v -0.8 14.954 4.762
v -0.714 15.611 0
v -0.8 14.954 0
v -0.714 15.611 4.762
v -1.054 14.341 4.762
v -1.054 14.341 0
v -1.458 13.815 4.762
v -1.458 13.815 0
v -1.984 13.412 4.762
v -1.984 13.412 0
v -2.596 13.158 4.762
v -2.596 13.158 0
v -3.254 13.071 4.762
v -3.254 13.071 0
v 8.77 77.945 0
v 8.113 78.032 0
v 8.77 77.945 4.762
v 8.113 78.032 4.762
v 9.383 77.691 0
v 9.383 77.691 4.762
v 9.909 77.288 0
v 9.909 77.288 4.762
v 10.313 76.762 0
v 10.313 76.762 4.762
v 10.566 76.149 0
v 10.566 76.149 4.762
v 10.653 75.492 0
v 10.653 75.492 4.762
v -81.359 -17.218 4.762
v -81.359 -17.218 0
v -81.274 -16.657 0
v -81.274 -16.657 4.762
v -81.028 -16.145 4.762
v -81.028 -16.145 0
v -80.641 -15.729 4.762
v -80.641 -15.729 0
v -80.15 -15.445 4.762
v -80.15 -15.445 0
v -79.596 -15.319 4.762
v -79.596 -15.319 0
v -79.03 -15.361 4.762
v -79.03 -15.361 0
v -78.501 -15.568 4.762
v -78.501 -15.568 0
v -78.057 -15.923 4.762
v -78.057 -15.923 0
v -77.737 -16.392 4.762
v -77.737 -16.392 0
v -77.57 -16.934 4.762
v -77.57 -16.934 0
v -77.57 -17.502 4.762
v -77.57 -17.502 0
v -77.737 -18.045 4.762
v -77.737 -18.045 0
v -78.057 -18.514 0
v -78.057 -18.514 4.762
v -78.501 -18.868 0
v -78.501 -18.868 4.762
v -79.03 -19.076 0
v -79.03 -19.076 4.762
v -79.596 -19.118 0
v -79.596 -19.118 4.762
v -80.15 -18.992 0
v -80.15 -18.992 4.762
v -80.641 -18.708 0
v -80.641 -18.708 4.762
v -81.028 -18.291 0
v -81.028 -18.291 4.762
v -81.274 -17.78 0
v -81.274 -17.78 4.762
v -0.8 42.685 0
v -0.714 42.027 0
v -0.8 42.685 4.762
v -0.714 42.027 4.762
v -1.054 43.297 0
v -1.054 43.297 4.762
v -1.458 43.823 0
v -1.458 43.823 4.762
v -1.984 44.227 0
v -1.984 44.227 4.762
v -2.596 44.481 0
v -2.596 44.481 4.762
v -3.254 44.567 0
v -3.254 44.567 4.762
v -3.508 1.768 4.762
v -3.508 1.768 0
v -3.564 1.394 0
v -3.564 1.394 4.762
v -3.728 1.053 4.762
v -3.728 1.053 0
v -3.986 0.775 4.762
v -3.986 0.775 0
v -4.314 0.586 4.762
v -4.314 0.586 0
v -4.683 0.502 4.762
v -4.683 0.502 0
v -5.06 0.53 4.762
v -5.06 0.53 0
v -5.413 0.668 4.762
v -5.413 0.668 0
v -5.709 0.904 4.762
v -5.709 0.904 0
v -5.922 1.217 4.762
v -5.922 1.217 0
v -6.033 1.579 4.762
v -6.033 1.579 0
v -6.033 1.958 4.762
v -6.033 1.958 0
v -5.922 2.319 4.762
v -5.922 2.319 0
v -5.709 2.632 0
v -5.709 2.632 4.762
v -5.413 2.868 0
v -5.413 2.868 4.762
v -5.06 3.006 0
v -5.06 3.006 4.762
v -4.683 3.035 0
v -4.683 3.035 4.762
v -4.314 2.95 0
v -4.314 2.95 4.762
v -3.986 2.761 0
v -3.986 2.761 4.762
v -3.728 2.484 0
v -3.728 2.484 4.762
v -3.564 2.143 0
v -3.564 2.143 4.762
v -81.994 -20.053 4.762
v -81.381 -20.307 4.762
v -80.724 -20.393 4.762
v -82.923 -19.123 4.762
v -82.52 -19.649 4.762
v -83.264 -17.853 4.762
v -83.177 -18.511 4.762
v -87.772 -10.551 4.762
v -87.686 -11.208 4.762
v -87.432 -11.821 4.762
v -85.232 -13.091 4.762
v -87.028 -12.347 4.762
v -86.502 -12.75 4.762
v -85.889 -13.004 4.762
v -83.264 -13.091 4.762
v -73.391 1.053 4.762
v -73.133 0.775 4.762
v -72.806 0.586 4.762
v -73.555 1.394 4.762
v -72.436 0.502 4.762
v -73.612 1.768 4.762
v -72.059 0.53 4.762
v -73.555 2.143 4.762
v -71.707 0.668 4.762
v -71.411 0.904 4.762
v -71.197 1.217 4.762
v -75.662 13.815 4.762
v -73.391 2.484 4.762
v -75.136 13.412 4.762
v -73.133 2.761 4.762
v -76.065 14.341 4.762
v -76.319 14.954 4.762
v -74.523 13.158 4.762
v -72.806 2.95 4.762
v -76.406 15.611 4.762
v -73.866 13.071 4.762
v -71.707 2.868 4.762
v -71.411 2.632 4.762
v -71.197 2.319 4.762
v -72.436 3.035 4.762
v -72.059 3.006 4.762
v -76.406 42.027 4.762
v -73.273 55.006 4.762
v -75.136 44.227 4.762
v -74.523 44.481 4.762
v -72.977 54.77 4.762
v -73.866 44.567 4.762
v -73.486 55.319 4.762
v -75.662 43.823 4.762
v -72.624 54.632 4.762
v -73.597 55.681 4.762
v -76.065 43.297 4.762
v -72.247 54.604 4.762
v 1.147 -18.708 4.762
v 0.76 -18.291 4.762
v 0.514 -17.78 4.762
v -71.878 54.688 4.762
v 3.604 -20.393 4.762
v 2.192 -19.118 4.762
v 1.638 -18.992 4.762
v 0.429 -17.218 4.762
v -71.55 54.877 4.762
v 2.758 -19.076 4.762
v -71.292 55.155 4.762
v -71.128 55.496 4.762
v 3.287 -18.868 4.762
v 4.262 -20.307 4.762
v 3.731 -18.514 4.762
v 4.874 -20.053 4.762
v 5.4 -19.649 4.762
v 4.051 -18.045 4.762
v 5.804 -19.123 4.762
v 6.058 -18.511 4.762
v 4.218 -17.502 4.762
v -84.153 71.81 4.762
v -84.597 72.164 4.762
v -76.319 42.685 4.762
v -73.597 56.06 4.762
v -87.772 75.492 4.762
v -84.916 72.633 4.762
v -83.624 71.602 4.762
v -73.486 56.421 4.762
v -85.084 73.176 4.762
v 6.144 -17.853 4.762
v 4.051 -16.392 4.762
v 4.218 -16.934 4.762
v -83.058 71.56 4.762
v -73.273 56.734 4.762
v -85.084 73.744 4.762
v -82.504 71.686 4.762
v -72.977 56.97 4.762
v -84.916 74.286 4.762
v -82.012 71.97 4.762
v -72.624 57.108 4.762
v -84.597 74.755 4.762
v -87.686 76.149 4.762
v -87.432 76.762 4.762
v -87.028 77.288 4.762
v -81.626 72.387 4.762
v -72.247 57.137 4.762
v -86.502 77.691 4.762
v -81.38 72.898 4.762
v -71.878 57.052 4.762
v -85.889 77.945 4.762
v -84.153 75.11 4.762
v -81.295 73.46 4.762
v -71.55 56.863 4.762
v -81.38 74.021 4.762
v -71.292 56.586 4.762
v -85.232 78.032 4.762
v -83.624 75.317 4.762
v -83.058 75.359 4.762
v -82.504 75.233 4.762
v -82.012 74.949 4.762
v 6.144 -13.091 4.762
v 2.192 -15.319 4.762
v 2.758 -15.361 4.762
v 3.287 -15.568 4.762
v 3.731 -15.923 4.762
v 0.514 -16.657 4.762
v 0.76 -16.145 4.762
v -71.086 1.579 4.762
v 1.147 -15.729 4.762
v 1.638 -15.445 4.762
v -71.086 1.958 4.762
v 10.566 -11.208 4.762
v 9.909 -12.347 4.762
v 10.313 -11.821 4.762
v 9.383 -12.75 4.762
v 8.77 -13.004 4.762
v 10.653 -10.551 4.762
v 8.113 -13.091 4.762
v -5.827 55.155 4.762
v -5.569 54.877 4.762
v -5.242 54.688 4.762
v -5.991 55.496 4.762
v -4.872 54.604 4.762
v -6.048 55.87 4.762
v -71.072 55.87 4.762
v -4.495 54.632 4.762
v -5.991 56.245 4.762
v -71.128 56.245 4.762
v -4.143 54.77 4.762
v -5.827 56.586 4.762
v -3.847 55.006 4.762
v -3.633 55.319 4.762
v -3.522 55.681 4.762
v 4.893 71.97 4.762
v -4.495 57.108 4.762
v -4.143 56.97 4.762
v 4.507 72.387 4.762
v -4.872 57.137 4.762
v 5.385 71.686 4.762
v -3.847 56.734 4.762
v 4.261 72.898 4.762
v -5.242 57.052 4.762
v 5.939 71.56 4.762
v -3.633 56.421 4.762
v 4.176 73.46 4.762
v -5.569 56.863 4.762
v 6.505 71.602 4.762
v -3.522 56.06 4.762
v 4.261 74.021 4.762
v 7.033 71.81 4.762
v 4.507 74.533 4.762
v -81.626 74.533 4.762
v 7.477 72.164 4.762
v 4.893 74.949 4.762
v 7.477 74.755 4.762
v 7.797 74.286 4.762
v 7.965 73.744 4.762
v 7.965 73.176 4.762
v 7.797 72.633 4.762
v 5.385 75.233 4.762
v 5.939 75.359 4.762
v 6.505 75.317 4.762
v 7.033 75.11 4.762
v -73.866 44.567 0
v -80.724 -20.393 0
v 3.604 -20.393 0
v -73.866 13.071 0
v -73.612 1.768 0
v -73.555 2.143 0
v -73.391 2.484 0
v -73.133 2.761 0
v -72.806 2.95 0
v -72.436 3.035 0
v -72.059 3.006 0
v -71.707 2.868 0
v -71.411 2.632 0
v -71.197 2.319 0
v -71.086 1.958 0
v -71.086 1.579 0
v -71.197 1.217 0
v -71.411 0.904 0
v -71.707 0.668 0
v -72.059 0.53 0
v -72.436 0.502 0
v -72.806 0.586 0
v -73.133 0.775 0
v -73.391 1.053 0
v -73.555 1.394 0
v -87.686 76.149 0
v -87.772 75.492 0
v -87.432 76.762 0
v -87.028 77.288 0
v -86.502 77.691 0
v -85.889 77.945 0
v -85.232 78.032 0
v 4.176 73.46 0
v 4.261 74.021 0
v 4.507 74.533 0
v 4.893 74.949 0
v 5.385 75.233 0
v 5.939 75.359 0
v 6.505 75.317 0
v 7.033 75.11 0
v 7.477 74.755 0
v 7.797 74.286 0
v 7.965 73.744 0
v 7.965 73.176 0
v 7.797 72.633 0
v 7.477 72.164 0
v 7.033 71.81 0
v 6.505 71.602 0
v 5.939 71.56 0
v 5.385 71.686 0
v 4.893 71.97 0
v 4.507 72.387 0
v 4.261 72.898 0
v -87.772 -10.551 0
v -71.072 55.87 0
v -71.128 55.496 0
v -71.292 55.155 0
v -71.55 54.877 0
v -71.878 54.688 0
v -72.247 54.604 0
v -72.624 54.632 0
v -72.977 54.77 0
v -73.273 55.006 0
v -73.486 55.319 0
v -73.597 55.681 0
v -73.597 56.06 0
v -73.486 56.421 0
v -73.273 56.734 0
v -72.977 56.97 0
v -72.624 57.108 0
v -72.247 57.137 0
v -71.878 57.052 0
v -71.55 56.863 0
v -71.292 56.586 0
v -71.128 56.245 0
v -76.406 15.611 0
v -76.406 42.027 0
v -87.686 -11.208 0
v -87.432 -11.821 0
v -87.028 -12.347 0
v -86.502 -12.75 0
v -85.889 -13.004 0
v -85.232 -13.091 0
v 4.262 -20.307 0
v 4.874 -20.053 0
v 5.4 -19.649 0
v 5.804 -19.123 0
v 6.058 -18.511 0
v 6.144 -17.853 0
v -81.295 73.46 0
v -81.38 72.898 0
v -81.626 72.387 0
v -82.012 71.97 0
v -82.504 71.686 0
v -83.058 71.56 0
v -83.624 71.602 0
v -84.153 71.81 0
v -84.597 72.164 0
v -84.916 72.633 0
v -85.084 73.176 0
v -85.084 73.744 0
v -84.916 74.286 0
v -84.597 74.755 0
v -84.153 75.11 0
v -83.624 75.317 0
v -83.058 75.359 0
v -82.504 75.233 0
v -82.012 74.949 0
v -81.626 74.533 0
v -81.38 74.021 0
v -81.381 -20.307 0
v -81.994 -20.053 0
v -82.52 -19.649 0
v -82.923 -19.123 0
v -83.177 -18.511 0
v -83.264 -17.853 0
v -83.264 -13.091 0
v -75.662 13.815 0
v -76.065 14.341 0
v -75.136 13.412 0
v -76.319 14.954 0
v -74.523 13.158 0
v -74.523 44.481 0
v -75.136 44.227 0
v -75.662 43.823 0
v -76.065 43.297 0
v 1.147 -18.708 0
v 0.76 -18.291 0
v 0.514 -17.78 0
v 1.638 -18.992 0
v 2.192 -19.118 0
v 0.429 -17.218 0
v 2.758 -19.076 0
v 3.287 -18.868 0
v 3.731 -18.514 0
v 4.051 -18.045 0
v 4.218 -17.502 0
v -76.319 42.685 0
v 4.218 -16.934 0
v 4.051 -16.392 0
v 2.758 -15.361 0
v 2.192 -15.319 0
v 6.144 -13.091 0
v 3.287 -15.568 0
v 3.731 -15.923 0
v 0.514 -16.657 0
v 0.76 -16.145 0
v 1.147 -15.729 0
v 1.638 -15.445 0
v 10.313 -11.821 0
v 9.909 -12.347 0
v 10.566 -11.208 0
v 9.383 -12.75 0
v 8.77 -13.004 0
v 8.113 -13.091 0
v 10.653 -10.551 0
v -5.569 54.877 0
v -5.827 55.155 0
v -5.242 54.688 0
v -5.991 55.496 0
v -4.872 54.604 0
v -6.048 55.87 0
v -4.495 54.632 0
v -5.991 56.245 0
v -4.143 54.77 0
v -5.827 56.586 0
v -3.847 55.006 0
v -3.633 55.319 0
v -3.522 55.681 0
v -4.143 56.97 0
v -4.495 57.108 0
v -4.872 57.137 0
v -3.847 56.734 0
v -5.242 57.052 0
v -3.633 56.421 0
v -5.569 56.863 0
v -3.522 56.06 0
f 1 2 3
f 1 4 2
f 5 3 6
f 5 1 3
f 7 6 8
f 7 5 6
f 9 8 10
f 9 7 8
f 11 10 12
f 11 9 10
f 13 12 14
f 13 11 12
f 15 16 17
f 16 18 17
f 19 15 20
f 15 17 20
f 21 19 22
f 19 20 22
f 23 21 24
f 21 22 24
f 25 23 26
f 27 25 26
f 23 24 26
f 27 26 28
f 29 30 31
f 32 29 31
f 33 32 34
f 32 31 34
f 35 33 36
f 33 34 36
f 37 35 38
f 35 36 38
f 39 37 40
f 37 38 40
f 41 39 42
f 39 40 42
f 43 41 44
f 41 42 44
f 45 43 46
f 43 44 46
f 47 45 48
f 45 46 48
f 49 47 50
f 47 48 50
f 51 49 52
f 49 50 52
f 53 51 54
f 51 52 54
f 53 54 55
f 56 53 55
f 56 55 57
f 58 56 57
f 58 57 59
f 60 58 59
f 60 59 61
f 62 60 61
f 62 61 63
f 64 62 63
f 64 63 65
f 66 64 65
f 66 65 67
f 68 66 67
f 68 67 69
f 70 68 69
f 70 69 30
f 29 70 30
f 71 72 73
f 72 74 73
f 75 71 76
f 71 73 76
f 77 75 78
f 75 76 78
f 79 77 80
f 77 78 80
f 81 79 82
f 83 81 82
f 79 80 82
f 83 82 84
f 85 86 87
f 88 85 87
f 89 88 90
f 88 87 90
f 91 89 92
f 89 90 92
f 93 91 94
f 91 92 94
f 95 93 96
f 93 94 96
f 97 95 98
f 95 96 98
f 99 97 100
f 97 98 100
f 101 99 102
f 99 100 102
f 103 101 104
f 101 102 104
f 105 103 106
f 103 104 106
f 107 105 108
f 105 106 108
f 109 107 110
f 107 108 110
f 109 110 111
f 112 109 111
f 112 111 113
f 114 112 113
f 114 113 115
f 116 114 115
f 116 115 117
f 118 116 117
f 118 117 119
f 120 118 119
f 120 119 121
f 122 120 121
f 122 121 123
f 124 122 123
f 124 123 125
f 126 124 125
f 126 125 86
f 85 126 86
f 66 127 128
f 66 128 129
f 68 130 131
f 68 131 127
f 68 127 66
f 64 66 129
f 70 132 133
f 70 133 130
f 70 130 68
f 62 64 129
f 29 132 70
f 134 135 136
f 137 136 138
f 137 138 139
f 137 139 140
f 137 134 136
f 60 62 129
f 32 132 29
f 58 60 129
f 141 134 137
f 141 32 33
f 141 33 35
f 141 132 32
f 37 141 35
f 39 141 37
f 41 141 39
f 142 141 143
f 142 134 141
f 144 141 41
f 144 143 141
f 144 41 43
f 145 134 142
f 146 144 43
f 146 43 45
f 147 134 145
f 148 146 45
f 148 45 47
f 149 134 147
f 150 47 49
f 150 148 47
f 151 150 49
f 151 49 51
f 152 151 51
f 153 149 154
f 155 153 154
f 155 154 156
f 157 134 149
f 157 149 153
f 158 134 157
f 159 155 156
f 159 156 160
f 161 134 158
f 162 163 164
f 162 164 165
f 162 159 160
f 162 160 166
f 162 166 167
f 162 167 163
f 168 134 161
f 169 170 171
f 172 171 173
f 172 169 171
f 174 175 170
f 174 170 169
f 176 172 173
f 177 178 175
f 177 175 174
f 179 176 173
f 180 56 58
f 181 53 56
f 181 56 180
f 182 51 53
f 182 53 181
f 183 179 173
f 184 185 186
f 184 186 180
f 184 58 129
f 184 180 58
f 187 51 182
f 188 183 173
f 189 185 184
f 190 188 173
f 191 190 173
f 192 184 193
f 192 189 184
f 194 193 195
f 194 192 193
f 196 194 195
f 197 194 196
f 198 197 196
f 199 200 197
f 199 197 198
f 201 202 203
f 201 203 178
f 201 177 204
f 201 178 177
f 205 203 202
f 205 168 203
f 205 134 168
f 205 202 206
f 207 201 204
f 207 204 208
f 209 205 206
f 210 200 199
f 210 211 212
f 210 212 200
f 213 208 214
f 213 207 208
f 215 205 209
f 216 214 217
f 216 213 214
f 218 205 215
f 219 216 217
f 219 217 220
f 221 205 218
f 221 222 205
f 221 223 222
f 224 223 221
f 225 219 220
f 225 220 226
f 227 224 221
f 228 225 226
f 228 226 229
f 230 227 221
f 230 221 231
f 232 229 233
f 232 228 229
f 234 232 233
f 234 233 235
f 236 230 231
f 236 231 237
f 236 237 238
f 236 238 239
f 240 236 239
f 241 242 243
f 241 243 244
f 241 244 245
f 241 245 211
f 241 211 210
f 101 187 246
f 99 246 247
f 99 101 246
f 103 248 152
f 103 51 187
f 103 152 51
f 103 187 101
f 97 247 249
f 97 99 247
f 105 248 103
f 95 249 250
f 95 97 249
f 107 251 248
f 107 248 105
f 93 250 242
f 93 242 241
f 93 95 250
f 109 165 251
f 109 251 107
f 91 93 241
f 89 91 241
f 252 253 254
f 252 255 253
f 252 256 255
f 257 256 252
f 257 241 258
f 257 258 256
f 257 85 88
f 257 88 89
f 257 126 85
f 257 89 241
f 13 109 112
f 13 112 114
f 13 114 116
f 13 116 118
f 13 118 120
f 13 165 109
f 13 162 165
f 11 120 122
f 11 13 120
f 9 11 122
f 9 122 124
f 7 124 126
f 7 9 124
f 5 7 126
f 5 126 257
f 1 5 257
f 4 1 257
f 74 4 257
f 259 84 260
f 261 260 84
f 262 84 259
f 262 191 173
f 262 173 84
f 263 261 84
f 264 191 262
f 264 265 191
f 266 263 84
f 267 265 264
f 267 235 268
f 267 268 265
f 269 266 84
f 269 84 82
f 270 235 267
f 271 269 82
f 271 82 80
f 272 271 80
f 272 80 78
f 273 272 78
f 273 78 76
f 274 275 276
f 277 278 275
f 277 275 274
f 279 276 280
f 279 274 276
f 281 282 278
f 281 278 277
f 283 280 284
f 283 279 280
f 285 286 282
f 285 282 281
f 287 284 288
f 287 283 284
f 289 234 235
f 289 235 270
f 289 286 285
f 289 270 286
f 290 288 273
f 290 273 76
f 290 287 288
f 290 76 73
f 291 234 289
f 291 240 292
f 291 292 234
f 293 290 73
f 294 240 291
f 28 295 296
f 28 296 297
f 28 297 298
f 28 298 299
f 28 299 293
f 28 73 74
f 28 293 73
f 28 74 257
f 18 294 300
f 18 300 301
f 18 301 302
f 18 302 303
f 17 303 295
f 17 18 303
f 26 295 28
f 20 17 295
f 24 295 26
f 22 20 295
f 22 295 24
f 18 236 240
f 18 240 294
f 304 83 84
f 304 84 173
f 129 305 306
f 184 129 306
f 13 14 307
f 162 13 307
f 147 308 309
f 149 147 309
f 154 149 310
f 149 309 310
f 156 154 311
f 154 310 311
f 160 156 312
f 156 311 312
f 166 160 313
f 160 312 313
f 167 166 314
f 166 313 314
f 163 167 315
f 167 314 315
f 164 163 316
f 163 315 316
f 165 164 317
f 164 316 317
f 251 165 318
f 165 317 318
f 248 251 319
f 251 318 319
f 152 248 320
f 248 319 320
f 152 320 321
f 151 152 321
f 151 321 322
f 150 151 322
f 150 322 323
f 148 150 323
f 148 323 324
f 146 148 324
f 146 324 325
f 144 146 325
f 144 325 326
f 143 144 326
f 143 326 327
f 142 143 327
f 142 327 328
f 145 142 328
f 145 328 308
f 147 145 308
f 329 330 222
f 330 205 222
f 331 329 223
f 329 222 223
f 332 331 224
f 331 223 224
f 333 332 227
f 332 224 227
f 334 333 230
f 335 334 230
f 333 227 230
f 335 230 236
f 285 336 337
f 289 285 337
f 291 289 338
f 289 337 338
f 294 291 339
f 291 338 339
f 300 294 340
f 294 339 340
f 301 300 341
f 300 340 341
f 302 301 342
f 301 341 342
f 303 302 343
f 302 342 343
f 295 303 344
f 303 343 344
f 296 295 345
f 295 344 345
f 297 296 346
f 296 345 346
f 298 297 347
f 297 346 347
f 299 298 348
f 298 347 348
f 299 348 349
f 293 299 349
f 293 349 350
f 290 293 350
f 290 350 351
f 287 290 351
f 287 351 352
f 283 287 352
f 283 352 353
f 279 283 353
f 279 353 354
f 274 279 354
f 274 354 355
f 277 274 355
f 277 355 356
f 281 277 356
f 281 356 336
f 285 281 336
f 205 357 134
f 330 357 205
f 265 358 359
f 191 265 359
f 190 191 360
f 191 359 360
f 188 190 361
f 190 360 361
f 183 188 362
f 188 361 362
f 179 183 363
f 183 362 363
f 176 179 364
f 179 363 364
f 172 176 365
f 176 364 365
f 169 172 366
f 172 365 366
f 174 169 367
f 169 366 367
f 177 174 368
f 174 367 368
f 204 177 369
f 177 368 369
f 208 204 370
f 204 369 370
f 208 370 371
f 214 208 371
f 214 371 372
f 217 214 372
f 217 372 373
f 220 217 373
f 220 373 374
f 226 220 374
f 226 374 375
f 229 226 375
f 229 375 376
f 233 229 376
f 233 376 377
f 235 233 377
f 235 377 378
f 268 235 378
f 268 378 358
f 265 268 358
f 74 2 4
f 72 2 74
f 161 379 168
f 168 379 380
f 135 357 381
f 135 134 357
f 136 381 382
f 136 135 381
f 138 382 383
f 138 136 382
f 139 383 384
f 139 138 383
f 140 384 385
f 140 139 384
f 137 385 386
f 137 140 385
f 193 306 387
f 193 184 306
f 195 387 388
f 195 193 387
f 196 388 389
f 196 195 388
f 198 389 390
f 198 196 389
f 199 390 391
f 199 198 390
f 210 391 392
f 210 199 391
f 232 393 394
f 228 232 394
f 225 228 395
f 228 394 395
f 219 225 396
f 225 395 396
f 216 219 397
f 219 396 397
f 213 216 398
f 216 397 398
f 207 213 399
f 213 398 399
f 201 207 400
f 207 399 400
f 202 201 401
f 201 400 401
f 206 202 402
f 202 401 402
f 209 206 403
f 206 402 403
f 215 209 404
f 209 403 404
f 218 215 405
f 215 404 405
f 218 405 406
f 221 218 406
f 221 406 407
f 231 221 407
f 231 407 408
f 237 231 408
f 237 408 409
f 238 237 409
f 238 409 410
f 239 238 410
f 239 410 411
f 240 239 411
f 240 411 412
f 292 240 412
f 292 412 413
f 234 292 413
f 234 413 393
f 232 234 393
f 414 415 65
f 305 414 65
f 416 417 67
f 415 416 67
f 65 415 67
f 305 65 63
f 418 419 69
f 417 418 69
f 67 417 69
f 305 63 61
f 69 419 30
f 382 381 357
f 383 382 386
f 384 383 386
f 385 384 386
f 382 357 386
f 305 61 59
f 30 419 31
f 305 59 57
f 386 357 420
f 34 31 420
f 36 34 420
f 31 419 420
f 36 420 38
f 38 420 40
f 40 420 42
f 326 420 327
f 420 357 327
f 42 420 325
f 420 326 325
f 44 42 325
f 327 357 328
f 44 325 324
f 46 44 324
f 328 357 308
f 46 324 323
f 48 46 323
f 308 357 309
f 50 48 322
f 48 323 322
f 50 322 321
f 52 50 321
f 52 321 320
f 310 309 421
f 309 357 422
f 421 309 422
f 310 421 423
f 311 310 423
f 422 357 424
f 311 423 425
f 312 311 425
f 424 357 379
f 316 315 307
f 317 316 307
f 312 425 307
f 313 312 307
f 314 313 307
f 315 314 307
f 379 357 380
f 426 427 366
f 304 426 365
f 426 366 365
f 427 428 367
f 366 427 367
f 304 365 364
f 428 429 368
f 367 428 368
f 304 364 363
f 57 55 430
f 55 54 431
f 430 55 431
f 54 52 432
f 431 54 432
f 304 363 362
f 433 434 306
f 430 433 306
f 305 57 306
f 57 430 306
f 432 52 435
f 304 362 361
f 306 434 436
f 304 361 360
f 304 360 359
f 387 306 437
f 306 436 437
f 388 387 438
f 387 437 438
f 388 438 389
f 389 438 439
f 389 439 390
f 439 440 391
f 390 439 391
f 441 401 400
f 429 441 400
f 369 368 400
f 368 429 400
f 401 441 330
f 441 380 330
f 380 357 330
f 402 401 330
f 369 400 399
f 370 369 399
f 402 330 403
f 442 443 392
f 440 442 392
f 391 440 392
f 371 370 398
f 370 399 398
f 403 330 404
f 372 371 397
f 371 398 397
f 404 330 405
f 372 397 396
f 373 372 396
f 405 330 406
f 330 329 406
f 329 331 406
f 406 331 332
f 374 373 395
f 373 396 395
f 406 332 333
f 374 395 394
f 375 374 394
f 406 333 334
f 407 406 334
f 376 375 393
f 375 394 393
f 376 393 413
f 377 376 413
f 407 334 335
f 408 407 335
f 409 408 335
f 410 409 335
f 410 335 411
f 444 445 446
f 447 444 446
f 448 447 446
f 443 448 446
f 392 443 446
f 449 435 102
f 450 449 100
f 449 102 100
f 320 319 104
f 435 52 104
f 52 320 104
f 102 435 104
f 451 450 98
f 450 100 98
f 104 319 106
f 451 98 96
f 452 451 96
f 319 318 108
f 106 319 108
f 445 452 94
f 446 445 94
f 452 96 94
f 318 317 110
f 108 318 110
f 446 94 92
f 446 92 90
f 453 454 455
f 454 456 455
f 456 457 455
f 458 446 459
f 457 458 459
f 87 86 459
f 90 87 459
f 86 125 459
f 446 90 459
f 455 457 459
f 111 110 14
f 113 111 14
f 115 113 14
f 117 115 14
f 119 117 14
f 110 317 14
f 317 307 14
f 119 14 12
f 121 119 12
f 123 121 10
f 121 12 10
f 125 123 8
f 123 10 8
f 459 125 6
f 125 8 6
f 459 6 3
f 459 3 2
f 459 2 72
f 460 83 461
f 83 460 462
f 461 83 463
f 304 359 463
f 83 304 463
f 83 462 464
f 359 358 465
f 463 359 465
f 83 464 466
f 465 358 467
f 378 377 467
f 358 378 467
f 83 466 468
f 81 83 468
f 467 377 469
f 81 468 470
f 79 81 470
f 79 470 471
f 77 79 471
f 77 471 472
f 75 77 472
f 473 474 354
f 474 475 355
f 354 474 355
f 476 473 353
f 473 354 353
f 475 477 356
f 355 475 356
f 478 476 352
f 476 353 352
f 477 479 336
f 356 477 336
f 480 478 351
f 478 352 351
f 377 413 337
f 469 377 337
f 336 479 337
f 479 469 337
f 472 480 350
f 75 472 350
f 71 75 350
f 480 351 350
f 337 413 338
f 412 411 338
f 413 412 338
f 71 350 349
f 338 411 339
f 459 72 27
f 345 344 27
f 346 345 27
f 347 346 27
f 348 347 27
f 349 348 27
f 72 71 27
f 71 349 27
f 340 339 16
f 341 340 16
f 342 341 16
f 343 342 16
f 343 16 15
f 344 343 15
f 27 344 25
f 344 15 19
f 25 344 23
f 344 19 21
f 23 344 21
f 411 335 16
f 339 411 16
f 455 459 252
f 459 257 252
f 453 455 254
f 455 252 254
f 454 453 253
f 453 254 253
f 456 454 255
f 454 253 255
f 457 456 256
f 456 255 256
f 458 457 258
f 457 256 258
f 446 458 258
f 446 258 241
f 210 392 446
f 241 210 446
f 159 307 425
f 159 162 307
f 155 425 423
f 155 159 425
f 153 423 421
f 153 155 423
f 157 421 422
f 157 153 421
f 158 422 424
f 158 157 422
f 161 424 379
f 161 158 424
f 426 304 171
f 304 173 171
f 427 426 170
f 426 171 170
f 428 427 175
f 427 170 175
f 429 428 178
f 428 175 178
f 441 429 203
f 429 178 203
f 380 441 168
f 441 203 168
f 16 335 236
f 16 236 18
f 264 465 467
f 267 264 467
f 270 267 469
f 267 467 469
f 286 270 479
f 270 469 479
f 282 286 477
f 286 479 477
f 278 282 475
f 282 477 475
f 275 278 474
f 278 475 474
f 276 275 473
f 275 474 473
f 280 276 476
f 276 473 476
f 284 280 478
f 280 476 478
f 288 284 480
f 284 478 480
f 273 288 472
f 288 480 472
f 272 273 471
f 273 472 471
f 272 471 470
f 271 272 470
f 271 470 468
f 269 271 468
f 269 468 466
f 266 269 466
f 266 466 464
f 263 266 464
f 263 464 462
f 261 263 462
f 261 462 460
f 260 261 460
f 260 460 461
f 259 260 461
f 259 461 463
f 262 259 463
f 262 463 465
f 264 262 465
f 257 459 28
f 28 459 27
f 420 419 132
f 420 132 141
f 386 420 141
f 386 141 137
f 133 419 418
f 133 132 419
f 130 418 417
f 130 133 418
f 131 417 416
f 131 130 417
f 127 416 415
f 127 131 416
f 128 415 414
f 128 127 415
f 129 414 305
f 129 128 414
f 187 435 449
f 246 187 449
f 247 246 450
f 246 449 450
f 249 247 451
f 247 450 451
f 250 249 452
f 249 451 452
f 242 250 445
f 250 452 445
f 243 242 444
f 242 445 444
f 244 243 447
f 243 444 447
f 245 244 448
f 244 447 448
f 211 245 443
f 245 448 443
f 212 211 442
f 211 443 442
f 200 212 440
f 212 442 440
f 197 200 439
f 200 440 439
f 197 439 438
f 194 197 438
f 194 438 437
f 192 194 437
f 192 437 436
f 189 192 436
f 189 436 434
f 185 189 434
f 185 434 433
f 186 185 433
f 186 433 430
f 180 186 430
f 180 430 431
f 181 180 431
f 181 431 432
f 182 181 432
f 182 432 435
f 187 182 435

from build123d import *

# Parameters (mm, degrees)
SKETCH1_W           = 98.425
SKETCH1_H           = 98.425
BOSS_EXTRUDE1_DEPTH = 4.7625
CUT_EXTRUDE1_REACH  = 119.54
SKETCH4_R           = 1.27
SKETCH4_R_2         = 1.905
SKETCH4_W           = 75.692
SKETCH4_H           = 31.496
CUT_EXTRUDE2_REACH  = 119.54
SKETCH5_W           = 4.5085
SKETCH5_H           = 7.3025
FILLET1_R           = 2.54
FILLET3_R           = 2.54
FILLET4_R           = 2.54


with BuildPart() as part:
    # Sketch1 → Boss-Extrude1 (new body)
    with BuildSketch(Plane.XY):
        with Locations((-38.559564005, 28.819230769)):
            Rectangle(SKETCH1_W, SKETCH1_H)
    extrude(amount=BOSS_EXTRUDE1_DEPTH)

    # Sketch4 → Cut-Extrude1 (cut, up to next)
    with BuildSketch(Plane(origin=(0, 0, 0), x_dir=(-1, 0, 0), z_dir=(0, 0, -1)), mode=Mode.PRIVATE) as cut_extrude1_sk1:
        with Locations(Location((72.341564005, 55.870230769, 0), (0, 0, 180))):
            Circle(SKETCH4_R)
    cut_extrude1_tool1 = extrude(cut_extrude1_sk1.sketch, amount=-CUT_EXTRUDE1_REACH, mode=Mode.PRIVATE) & part.part
    # Sketch4 → Cut-Extrude1 (cut, up to next)
    with BuildSketch(Plane(origin=(0, 0, 0), x_dir=(-1, 0, 0), z_dir=(0, 0, -1)), mode=Mode.PRIVATE) as cut_extrude1_sk2:
        with Locations((72.341564005, 1.768230769)):
            Circle(SKETCH4_R)
    cut_extrude1_tool2 = extrude(cut_extrude1_sk2.sketch, amount=-CUT_EXTRUDE1_REACH, mode=Mode.PRIVATE) & part.part
    # Sketch4 → Cut-Extrude1 (cut, up to next)
    with BuildSketch(Plane(origin=(0, 0, 0), x_dir=(-1, 0, 0), z_dir=(0, 0, -1)), mode=Mode.PRIVATE) as cut_extrude1_sk3:
        with Locations((4.777564005, 55.870230769)):
            Circle(SKETCH4_R)
    cut_extrude1_tool3 = extrude(cut_extrude1_sk3.sketch, amount=-CUT_EXTRUDE1_REACH, mode=Mode.PRIVATE) & part.part
    # Sketch4 → Cut-Extrude1 (cut, up to next)
    with BuildSketch(Plane(origin=(0, 0, 0), x_dir=(-1, 0, 0), z_dir=(0, 0, -1)), mode=Mode.PRIVATE) as cut_extrude1_sk4:
        with Locations(Location((4.777564005, 1.768230769, 0), (0, 0, 180))):
            Circle(SKETCH4_R)
    cut_extrude1_tool4 = extrude(cut_extrude1_sk4.sketch, amount=-CUT_EXTRUDE1_REACH, mode=Mode.PRIVATE) & part.part
    # Sketch4 → Cut-Extrude1 (cut, up to next)
    with BuildSketch(Plane(origin=(0, 0, 0), x_dir=(-1, 0, 0), z_dir=(0, 0, -1)), mode=Mode.PRIVATE) as cut_extrude1_sk5:
        with Locations((-6.080935995, 73.459730769)):
            Circle(SKETCH4_R_2)
    cut_extrude1_tool5 = extrude(cut_extrude1_sk5.sketch, amount=-CUT_EXTRUDE1_REACH, mode=Mode.PRIVATE) & part.part
    # Sketch4 → Cut-Extrude1 (cut, up to next)
    with BuildSketch(Plane(origin=(0, 0, 0), x_dir=(-1, 0, 0), z_dir=(0, 0, -1)), mode=Mode.PRIVATE) as cut_extrude1_sk6:
        with Locations(Location((83.200064005, 73.459730769, 0), (0, 0, 180))):
            Circle(SKETCH4_R_2)
    cut_extrude1_tool6 = extrude(cut_extrude1_sk6.sketch, amount=-CUT_EXTRUDE1_REACH, mode=Mode.PRIVATE) & part.part
    # Sketch4 → Cut-Extrude1 (cut, up to next)
    with BuildSketch(Plane(origin=(0, 0, 0), x_dir=(-1, 0, 0), z_dir=(0, 0, -1)), mode=Mode.PRIVATE) as cut_extrude1_sk7:
        with Locations((-2.334435995, -17.218269231)):
            Circle(SKETCH4_R_2)
    cut_extrude1_tool7 = extrude(cut_extrude1_sk7.sketch, amount=-CUT_EXTRUDE1_REACH, mode=Mode.PRIVATE) & part.part
    # Sketch4 → Cut-Extrude1 (cut, up to next)
    with BuildSketch(Plane(origin=(0, 0, 0), x_dir=(-1, 0, 0), z_dir=(0, 0, -1)), mode=Mode.PRIVATE) as cut_extrude1_sk8:
        with Locations((79.453564005, -17.218269231)):
            Circle(SKETCH4_R_2)
    cut_extrude1_tool8 = extrude(cut_extrude1_sk8.sketch, amount=-CUT_EXTRUDE1_REACH, mode=Mode.PRIVATE) & part.part
    # Sketch4 → Cut-Extrude1 (cut, up to next)
    with BuildSketch(Plane(origin=(0, 0, 0), x_dir=(-1, 0, 0), z_dir=(0, 0, -1)), mode=Mode.PRIVATE) as cut_extrude1_sk9:
        with Locations((38.559564005, 28.819230769)):
            Rectangle(SKETCH4_W, SKETCH4_H)
    cut_extrude1_tool9 = extrude(cut_extrude1_sk9.sketch, amount=-CUT_EXTRUDE1_REACH, mode=Mode.PRIVATE) & part.part
    add(cut_extrude1_tool1.solids().sort_by_distance((-72.341564, 55.870231, 0))[0], mode=Mode.SUBTRACT)
    add(cut_extrude1_tool2.solids().sort_by_distance((-72.341564, 1.768231, 0))[0], mode=Mode.SUBTRACT)
    add(cut_extrude1_tool3.solids().sort_by_distance((-4.777564, 55.870231, 0))[0], mode=Mode.SUBTRACT)
    add(cut_extrude1_tool4.solids().sort_by_distance((-4.777564, 1.768231, 0))[0], mode=Mode.SUBTRACT)
    add(cut_extrude1_tool5.solids().sort_by_distance((6.080936, 73.459731, 0))[0], mode=Mode.SUBTRACT)
    add(cut_extrude1_tool6.solids().sort_by_distance((-83.200064, 73.459731, 0))[0], mode=Mode.SUBTRACT)
    add(cut_extrude1_tool7.solids().sort_by_distance((2.334436, -17.218269, 0))[0], mode=Mode.SUBTRACT)
    add(cut_extrude1_tool8.solids().sort_by_distance((-79.453564, -17.218269, 0))[0], mode=Mode.SUBTRACT)
    add(cut_extrude1_tool9.solids().sort_by_distance((-38.559564, 28.819231, 0))[0], mode=Mode.SUBTRACT)

    # Sketch5 → Cut-Extrude2 (cut, up to next)
    with BuildSketch(Plane(origin=(0, 0, 0), x_dir=(-1, 0, 0), z_dir=(0, 0, -1)), mode=Mode.PRIVATE) as cut_extrude2_sk1:
        with Locations((-8.398685995, -16.742019231)):
            Rectangle(SKETCH5_W, SKETCH5_H)
    cut_extrude2_tool1 = extrude(cut_extrude2_sk1.sketch, amount=-CUT_EXTRUDE2_REACH, mode=Mode.PRIVATE) & part.part
    # Sketch5 → Cut-Extrude2 (cut, up to next)
    with BuildSketch(Plane(origin=(0, 0, 0), x_dir=(-1, 0, 0), z_dir=(0, 0, -1)), mode=Mode.PRIVATE) as cut_extrude2_sk2:
        with Locations((85.517814005, -16.742019231)):
            Rectangle(SKETCH5_W, SKETCH5_H)
    cut_extrude2_tool2 = extrude(cut_extrude2_sk2.sketch, amount=-CUT_EXTRUDE2_REACH, mode=Mode.PRIVATE) & part.part
    add(cut_extrude2_tool1.solids().sort_by_distance((8.398686, -16.742019, 0))[0], mode=Mode.SUBTRACT)
    add(cut_extrude2_tool2.solids().sort_by_distance((-85.517814, -16.742019, 0))[0], mode=Mode.SUBTRACT)

    # Fillet1
    fillet1_edges = [part.edges().sort_by_distance(p)[0] for p in [
        (-87.772064005, 78.031730769, 2.38125),
        (10.652935995, 78.031730769, 2.38125),
    ]]
    fillet(fillet1_edges, radius=FILLET1_R)

    # Fillet3
    fillet3_edges = [part.edges().sort_by_distance(p)[0] for p in [
        (-0.713564005, 13.071230769, 2.38125),
        (-0.713564005, 44.567230769, 2.38125),
        (-76.405564005, 44.567230769, 2.38125),
        (-76.405564005, 13.071230769, 2.38125),
    ]]
    fillet(fillet3_edges, radius=FILLET3_R)

    # Fillet4
    fillet4_edges = [part.edges().sort_by_distance(p)[0] for p in [
        (6.144435995, -20.393269231, 2.38125),
        (10.652935995, -13.090769231, 2.38125),
        (-83.263564005, -20.393269231, 2.38125),
        (-87.772064005, -13.090769231, 2.38125),
    ]]
    fillet(fillet4_edges, radius=FILLET4_R)


solid = part.part
